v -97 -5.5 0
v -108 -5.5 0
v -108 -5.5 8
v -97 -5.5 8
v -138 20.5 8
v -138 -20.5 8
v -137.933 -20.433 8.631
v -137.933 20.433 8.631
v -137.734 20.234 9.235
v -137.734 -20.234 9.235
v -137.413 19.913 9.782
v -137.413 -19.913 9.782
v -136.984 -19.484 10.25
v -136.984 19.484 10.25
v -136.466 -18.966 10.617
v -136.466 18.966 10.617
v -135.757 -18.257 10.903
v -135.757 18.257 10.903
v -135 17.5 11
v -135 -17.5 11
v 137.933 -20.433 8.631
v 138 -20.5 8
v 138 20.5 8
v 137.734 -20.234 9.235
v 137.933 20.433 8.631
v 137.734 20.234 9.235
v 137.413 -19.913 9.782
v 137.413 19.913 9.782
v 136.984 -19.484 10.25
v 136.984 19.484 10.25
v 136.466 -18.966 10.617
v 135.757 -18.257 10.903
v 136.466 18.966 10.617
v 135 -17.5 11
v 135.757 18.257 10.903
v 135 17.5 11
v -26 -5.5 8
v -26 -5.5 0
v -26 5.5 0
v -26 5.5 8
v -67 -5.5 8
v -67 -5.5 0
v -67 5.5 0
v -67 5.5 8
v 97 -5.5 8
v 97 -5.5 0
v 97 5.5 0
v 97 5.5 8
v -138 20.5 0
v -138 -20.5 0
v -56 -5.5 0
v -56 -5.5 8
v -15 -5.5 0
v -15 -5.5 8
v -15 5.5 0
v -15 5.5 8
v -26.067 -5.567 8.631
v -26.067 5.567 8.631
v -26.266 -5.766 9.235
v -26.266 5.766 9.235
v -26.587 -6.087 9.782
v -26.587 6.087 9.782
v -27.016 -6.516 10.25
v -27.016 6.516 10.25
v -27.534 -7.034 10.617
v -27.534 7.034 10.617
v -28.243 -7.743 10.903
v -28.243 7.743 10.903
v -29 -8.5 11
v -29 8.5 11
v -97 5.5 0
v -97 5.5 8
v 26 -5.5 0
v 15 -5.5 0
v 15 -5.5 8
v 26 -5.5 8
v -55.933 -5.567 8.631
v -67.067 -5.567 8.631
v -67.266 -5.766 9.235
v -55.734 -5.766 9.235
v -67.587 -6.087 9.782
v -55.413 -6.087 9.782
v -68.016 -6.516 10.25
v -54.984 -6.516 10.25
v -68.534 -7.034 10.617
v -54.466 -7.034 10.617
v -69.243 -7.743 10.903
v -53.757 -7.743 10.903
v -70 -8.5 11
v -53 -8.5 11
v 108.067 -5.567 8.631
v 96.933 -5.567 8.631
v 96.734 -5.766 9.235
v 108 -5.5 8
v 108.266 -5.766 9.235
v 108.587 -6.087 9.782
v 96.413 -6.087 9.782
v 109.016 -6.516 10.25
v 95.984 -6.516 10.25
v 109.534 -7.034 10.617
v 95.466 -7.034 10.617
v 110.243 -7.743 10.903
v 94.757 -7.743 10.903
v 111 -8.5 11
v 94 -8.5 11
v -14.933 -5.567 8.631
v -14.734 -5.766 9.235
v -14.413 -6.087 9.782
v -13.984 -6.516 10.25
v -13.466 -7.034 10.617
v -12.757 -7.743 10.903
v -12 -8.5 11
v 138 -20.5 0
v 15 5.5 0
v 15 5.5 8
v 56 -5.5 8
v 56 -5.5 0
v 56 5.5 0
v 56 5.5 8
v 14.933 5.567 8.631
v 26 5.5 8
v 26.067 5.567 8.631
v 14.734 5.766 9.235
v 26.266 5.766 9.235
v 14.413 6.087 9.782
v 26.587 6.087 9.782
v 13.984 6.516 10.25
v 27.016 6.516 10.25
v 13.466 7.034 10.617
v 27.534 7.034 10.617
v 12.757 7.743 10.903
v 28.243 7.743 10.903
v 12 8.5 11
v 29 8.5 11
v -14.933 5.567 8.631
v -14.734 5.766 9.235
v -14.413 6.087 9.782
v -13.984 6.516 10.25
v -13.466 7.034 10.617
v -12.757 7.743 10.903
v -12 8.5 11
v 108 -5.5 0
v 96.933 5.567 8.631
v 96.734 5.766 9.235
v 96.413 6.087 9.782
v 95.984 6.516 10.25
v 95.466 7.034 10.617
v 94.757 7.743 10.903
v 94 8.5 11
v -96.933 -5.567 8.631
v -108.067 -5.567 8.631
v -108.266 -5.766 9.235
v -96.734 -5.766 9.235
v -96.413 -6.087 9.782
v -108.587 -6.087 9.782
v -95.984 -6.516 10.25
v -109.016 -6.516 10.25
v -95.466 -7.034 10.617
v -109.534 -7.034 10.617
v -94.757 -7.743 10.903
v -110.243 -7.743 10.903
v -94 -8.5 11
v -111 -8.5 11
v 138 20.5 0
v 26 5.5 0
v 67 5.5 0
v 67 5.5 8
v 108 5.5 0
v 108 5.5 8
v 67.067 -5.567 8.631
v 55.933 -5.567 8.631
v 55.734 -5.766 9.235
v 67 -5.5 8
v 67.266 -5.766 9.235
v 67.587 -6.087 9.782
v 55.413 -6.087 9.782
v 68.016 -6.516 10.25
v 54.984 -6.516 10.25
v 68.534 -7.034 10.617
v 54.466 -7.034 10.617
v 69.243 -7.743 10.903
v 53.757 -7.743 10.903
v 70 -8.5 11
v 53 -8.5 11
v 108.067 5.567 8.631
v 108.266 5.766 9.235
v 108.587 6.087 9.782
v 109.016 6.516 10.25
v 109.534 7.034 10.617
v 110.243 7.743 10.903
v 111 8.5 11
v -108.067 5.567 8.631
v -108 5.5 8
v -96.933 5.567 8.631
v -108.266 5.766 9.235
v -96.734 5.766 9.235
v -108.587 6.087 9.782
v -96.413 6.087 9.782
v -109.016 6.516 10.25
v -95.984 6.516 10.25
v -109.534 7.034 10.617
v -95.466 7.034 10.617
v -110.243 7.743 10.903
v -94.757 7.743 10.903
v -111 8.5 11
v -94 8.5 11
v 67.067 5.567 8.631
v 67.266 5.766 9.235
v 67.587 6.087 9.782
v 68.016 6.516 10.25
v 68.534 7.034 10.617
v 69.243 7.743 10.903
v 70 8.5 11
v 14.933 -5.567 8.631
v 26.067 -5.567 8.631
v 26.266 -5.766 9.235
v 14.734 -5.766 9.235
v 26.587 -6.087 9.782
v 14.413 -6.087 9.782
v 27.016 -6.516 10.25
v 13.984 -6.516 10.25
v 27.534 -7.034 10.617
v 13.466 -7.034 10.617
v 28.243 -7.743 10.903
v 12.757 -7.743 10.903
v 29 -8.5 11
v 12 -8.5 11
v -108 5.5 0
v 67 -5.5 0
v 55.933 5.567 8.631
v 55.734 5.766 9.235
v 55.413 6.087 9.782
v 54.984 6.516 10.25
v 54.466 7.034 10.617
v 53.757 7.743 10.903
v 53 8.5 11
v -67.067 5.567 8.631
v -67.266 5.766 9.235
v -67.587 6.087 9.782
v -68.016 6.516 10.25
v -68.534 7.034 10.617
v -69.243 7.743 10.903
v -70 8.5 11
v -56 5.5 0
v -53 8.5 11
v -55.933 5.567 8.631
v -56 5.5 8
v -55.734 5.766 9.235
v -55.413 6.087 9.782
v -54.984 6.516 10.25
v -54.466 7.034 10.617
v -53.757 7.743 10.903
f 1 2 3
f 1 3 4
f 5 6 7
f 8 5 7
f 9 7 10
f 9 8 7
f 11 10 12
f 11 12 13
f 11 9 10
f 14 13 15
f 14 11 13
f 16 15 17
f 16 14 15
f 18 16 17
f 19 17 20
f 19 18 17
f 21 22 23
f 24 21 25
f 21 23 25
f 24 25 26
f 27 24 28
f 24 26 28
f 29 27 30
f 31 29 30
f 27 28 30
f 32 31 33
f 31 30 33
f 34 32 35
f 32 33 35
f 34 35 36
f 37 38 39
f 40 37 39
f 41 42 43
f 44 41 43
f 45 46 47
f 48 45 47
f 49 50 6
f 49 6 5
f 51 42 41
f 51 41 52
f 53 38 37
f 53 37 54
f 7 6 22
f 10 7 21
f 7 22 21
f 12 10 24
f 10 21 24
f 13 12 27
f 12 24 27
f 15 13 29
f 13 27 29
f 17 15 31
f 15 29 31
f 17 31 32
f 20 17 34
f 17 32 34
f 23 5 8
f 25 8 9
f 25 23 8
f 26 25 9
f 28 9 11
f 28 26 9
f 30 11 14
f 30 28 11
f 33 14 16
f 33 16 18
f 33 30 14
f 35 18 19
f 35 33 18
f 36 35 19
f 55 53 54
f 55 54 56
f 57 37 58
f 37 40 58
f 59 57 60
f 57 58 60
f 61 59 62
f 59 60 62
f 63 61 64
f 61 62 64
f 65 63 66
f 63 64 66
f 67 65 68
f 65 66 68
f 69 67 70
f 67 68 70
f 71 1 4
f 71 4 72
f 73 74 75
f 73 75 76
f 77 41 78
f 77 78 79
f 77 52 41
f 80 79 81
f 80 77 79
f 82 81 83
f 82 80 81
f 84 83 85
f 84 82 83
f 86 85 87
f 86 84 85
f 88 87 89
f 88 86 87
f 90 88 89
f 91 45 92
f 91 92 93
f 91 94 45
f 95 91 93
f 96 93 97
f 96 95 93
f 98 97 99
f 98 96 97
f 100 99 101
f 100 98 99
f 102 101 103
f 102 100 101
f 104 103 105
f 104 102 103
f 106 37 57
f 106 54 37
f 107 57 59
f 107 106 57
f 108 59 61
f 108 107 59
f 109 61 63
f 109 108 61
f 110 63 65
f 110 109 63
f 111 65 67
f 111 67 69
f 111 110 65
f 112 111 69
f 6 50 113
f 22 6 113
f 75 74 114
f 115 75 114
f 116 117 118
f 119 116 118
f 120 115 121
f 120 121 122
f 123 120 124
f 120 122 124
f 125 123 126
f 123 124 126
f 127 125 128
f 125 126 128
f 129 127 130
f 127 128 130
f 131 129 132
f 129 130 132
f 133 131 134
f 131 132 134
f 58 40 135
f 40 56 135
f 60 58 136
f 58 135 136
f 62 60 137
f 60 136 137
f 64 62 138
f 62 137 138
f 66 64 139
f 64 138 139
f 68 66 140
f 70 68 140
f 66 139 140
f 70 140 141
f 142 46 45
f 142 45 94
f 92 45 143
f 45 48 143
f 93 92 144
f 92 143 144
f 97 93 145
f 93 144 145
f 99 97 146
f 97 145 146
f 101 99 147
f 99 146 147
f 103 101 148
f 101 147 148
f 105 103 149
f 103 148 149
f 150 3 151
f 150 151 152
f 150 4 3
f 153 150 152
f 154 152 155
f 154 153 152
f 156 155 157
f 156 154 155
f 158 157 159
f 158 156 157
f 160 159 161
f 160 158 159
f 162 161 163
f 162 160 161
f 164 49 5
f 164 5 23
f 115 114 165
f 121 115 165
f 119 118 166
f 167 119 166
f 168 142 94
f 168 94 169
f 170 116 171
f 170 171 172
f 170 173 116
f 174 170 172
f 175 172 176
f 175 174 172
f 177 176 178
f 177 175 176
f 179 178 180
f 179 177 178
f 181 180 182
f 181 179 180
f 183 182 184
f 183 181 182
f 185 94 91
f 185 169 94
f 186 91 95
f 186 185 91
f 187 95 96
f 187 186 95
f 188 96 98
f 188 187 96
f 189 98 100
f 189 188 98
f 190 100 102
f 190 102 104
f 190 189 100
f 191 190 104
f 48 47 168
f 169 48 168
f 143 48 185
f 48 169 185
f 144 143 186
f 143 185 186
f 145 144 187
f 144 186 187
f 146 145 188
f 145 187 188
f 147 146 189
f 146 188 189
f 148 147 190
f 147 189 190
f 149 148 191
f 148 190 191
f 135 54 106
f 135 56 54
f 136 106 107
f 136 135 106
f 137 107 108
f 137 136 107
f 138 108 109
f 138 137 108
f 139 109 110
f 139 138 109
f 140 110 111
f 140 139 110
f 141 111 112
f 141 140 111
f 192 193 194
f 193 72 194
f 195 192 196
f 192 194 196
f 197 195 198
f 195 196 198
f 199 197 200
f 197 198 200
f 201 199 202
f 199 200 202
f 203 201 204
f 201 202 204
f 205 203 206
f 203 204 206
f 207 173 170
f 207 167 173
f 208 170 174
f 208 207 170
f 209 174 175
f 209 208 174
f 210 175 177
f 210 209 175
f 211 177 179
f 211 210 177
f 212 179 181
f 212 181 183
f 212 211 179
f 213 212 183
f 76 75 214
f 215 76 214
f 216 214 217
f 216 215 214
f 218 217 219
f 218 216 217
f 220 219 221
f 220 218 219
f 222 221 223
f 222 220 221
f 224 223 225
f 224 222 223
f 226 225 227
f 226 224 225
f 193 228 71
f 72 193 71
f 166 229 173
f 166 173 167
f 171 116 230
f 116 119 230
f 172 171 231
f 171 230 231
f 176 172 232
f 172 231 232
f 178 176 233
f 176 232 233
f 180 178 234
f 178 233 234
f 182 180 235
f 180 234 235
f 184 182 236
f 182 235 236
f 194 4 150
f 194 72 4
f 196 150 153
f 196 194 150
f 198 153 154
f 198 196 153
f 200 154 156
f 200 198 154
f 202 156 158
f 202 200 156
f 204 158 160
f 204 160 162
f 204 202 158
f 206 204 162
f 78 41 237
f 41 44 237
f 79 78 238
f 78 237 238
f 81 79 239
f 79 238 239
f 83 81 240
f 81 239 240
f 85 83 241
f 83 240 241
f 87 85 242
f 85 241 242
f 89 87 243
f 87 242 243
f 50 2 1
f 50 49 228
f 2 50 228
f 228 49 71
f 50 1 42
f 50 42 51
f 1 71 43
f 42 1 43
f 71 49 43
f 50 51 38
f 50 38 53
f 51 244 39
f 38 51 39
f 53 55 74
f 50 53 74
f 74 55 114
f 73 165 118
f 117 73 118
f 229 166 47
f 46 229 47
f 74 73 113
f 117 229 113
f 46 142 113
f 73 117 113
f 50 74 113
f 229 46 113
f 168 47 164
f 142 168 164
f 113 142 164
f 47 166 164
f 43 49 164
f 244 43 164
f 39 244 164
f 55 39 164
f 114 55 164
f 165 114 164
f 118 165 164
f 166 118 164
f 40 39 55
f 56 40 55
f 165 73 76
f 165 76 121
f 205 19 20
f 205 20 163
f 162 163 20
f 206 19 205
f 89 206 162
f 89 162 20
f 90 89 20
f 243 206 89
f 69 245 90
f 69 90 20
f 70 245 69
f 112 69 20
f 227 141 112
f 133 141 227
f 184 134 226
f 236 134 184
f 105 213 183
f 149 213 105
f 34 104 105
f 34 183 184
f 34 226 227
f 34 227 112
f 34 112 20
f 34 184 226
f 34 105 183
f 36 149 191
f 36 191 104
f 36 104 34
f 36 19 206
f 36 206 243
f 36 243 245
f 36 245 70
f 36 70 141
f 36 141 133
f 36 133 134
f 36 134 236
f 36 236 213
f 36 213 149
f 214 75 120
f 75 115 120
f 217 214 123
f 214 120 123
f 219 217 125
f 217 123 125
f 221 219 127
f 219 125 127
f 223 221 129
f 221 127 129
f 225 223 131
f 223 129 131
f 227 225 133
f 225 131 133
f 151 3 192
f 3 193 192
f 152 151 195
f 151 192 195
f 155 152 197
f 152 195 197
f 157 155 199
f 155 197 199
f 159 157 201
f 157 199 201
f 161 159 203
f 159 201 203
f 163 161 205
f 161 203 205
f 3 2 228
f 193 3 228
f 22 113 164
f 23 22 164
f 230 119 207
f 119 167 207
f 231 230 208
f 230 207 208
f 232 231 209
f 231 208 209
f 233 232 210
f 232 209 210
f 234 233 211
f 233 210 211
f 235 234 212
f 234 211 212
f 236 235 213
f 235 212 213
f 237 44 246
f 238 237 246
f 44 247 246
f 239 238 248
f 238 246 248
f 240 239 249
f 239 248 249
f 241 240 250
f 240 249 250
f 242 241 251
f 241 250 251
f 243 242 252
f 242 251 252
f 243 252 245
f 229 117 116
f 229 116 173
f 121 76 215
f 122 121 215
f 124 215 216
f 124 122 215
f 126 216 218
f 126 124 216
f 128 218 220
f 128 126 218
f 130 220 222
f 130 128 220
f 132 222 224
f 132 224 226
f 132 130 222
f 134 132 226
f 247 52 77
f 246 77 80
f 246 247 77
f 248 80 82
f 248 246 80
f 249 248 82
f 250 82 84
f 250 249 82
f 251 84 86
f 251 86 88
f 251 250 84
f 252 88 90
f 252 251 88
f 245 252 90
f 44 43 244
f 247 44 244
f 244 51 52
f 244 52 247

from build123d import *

# Parameters (mm, degrees)
SKETCH_W   = 276
SKETCH_H   = 41
SKETCH_W_2 = 11
SKETCH_H_2 = 11
PAD_DEPTH  = 11
FILLET_R   = 3


with BuildPart() as part:
    # Sketch → Pad (new body)
    with BuildSketch(Plane.XY):
        Rectangle(SKETCH_W, SKETCH_H)
        with Locations((-102.5, 0)):
            Rectangle(SKETCH_W_2, SKETCH_H_2, mode=Mode.SUBTRACT)
        with Locations((-61.5, 0)):
            Rectangle(SKETCH_W_2, SKETCH_H_2, mode=Mode.SUBTRACT)
        with Locations((-20.5, 0)):
            Rectangle(SKETCH_W_2, SKETCH_H_2, mode=Mode.SUBTRACT)
        with Locations((20.5, 0)):
            Rectangle(SKETCH_W_2, SKETCH_H_2, mode=Mode.SUBTRACT)
        with Locations((61.5, 0)):
            Rectangle(SKETCH_W_2, SKETCH_H_2, mode=Mode.SUBTRACT)
        with Locations((102.5, 0)):
            Rectangle(SKETCH_W_2, SKETCH_H_2, mode=Mode.SUBTRACT)
    extrude(amount=PAD_DEPTH)

    # Fillet
    fillet_edges = [part.edges().sort_by_distance(p)[0] for p in [
        (-138, 0, 11),
        (0, -20.5, 11),
        (138, 0, 11),
        (0, 20.5, 11),
        (97, 0, 11),
        (102.5, -5.5, 11),
        (108, 0, 11),
        (102.5, 5.5, 11),
        (56, 0, 11),
        (61.5, -5.5, 11),
        (67, 0, 11),
        (61.5, 5.5, 11),
        (15, 0, 11),
        (20.5, -5.5, 11),
        (26, 0, 11),
        (20.5, 5.5, 11),
        (-26, 0, 11),
        (-20.5, -5.5, 11),
        (-15, 0, 11),
        (-20.5, 5.5, 11),
        (-67, 0, 11),
        (-61.5, -5.5, 11),
        (-56, 0, 11),
        (-61.5, 5.5, 11),
        (-108, 0, 11),
        (-102.5, -5.5, 11),
        (-97, 0, 11),
        (-102.5, 5.5, 11),
    ]]
    fillet(fillet_edges, radius=FILLET_R)


solid = part.part
